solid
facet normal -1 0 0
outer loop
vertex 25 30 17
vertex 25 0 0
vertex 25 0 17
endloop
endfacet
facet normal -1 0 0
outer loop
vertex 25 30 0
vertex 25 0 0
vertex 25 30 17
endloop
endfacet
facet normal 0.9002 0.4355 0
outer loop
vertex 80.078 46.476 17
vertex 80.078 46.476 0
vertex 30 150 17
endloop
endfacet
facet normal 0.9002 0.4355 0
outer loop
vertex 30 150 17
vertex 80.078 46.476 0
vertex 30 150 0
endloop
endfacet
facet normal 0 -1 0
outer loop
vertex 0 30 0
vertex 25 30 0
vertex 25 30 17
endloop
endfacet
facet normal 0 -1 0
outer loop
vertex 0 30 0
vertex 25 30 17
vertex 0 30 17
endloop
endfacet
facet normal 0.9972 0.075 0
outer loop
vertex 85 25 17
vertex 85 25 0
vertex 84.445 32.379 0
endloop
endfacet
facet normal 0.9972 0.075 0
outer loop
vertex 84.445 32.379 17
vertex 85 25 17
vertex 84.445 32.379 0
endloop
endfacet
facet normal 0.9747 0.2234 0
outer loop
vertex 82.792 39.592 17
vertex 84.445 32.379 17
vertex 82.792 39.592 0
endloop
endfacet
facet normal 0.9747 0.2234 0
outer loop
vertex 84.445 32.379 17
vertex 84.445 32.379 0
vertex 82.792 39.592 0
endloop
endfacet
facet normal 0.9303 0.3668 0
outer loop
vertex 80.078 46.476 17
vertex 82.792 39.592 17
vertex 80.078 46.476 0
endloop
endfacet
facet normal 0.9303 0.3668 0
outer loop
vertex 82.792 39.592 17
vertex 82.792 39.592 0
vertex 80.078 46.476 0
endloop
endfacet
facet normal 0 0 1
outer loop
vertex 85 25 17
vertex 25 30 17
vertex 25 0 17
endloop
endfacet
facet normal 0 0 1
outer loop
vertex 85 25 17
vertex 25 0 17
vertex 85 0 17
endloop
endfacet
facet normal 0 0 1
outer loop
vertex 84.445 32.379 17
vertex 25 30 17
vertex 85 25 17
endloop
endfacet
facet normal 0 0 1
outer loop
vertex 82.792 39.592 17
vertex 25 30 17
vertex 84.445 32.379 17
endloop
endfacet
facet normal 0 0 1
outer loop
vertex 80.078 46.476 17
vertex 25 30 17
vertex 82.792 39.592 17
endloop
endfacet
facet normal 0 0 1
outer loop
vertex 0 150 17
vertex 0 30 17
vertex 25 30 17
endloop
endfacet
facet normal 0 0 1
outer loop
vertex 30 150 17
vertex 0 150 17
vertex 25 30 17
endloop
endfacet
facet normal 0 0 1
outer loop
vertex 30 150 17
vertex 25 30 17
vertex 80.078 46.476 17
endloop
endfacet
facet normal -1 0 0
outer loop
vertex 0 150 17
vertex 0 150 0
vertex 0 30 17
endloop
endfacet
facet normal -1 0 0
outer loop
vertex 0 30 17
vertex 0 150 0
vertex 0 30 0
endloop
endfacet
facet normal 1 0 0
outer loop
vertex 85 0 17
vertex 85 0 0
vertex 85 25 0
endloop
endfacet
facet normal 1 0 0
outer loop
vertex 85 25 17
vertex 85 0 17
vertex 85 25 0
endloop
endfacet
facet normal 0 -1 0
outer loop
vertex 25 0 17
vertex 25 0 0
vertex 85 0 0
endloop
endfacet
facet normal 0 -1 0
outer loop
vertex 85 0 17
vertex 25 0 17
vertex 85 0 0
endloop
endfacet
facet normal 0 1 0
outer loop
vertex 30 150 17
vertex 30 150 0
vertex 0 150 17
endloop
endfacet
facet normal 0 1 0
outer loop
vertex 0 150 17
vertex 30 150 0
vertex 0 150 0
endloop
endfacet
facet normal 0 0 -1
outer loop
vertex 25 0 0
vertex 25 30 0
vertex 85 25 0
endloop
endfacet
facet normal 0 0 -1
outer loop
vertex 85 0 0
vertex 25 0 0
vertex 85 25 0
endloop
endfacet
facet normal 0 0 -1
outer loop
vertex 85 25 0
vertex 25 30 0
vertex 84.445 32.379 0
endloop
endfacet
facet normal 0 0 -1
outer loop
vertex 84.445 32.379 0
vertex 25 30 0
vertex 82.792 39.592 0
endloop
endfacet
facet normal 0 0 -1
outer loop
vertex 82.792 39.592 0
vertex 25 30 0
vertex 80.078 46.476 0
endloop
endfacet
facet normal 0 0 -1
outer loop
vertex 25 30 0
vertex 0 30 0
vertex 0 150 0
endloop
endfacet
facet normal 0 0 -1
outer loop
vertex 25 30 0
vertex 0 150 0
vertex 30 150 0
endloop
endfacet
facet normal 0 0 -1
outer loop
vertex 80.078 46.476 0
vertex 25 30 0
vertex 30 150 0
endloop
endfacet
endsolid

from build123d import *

# Parameters (mm, degrees)
ESTRUSIONE_ESTRUSIONE1_DEPTH = 17
SCHIZZO2_W                   = 25
SCHIZZO2_H                   = 30
TAGLIO_ESTRUSIONE1_DEPTH     = 17


with BuildPart() as part:
    # Schizzo1 → Estrusione-Estrusione1 (new body)
    with BuildSketch(Plane.XY):
        with BuildLine():
            Line((0, 0), (85, 0))
            Line((85, 0), (85, 25))
            ThreePointArc((85, 25), (83.753843891, 36.016505892), (80.078350515, 46.47628866))
            Line((80.078350515, 46.47628866), (30, 150))
            Line((30, 150), (0, 150))
            Line((0, 150), (0, 0))
        make_face()
    extrude(amount=ESTRUSIONE_ESTRUSIONE1_DEPTH)

    # Schizzo2 → Taglio-Estrusione1 (cut)
    with BuildSketch(Plane(origin=(0, 0, 0), x_dir=(-1, 0, 0), z_dir=(0, 0, -1))):
        with Locations((-12.5, 15)):
            Rectangle(SCHIZZO2_W, SCHIZZO2_H)
    extrude(amount=-TAGLIO_ESTRUSIONE1_DEPTH, mode=Mode.SUBTRACT)


solid = part.part
